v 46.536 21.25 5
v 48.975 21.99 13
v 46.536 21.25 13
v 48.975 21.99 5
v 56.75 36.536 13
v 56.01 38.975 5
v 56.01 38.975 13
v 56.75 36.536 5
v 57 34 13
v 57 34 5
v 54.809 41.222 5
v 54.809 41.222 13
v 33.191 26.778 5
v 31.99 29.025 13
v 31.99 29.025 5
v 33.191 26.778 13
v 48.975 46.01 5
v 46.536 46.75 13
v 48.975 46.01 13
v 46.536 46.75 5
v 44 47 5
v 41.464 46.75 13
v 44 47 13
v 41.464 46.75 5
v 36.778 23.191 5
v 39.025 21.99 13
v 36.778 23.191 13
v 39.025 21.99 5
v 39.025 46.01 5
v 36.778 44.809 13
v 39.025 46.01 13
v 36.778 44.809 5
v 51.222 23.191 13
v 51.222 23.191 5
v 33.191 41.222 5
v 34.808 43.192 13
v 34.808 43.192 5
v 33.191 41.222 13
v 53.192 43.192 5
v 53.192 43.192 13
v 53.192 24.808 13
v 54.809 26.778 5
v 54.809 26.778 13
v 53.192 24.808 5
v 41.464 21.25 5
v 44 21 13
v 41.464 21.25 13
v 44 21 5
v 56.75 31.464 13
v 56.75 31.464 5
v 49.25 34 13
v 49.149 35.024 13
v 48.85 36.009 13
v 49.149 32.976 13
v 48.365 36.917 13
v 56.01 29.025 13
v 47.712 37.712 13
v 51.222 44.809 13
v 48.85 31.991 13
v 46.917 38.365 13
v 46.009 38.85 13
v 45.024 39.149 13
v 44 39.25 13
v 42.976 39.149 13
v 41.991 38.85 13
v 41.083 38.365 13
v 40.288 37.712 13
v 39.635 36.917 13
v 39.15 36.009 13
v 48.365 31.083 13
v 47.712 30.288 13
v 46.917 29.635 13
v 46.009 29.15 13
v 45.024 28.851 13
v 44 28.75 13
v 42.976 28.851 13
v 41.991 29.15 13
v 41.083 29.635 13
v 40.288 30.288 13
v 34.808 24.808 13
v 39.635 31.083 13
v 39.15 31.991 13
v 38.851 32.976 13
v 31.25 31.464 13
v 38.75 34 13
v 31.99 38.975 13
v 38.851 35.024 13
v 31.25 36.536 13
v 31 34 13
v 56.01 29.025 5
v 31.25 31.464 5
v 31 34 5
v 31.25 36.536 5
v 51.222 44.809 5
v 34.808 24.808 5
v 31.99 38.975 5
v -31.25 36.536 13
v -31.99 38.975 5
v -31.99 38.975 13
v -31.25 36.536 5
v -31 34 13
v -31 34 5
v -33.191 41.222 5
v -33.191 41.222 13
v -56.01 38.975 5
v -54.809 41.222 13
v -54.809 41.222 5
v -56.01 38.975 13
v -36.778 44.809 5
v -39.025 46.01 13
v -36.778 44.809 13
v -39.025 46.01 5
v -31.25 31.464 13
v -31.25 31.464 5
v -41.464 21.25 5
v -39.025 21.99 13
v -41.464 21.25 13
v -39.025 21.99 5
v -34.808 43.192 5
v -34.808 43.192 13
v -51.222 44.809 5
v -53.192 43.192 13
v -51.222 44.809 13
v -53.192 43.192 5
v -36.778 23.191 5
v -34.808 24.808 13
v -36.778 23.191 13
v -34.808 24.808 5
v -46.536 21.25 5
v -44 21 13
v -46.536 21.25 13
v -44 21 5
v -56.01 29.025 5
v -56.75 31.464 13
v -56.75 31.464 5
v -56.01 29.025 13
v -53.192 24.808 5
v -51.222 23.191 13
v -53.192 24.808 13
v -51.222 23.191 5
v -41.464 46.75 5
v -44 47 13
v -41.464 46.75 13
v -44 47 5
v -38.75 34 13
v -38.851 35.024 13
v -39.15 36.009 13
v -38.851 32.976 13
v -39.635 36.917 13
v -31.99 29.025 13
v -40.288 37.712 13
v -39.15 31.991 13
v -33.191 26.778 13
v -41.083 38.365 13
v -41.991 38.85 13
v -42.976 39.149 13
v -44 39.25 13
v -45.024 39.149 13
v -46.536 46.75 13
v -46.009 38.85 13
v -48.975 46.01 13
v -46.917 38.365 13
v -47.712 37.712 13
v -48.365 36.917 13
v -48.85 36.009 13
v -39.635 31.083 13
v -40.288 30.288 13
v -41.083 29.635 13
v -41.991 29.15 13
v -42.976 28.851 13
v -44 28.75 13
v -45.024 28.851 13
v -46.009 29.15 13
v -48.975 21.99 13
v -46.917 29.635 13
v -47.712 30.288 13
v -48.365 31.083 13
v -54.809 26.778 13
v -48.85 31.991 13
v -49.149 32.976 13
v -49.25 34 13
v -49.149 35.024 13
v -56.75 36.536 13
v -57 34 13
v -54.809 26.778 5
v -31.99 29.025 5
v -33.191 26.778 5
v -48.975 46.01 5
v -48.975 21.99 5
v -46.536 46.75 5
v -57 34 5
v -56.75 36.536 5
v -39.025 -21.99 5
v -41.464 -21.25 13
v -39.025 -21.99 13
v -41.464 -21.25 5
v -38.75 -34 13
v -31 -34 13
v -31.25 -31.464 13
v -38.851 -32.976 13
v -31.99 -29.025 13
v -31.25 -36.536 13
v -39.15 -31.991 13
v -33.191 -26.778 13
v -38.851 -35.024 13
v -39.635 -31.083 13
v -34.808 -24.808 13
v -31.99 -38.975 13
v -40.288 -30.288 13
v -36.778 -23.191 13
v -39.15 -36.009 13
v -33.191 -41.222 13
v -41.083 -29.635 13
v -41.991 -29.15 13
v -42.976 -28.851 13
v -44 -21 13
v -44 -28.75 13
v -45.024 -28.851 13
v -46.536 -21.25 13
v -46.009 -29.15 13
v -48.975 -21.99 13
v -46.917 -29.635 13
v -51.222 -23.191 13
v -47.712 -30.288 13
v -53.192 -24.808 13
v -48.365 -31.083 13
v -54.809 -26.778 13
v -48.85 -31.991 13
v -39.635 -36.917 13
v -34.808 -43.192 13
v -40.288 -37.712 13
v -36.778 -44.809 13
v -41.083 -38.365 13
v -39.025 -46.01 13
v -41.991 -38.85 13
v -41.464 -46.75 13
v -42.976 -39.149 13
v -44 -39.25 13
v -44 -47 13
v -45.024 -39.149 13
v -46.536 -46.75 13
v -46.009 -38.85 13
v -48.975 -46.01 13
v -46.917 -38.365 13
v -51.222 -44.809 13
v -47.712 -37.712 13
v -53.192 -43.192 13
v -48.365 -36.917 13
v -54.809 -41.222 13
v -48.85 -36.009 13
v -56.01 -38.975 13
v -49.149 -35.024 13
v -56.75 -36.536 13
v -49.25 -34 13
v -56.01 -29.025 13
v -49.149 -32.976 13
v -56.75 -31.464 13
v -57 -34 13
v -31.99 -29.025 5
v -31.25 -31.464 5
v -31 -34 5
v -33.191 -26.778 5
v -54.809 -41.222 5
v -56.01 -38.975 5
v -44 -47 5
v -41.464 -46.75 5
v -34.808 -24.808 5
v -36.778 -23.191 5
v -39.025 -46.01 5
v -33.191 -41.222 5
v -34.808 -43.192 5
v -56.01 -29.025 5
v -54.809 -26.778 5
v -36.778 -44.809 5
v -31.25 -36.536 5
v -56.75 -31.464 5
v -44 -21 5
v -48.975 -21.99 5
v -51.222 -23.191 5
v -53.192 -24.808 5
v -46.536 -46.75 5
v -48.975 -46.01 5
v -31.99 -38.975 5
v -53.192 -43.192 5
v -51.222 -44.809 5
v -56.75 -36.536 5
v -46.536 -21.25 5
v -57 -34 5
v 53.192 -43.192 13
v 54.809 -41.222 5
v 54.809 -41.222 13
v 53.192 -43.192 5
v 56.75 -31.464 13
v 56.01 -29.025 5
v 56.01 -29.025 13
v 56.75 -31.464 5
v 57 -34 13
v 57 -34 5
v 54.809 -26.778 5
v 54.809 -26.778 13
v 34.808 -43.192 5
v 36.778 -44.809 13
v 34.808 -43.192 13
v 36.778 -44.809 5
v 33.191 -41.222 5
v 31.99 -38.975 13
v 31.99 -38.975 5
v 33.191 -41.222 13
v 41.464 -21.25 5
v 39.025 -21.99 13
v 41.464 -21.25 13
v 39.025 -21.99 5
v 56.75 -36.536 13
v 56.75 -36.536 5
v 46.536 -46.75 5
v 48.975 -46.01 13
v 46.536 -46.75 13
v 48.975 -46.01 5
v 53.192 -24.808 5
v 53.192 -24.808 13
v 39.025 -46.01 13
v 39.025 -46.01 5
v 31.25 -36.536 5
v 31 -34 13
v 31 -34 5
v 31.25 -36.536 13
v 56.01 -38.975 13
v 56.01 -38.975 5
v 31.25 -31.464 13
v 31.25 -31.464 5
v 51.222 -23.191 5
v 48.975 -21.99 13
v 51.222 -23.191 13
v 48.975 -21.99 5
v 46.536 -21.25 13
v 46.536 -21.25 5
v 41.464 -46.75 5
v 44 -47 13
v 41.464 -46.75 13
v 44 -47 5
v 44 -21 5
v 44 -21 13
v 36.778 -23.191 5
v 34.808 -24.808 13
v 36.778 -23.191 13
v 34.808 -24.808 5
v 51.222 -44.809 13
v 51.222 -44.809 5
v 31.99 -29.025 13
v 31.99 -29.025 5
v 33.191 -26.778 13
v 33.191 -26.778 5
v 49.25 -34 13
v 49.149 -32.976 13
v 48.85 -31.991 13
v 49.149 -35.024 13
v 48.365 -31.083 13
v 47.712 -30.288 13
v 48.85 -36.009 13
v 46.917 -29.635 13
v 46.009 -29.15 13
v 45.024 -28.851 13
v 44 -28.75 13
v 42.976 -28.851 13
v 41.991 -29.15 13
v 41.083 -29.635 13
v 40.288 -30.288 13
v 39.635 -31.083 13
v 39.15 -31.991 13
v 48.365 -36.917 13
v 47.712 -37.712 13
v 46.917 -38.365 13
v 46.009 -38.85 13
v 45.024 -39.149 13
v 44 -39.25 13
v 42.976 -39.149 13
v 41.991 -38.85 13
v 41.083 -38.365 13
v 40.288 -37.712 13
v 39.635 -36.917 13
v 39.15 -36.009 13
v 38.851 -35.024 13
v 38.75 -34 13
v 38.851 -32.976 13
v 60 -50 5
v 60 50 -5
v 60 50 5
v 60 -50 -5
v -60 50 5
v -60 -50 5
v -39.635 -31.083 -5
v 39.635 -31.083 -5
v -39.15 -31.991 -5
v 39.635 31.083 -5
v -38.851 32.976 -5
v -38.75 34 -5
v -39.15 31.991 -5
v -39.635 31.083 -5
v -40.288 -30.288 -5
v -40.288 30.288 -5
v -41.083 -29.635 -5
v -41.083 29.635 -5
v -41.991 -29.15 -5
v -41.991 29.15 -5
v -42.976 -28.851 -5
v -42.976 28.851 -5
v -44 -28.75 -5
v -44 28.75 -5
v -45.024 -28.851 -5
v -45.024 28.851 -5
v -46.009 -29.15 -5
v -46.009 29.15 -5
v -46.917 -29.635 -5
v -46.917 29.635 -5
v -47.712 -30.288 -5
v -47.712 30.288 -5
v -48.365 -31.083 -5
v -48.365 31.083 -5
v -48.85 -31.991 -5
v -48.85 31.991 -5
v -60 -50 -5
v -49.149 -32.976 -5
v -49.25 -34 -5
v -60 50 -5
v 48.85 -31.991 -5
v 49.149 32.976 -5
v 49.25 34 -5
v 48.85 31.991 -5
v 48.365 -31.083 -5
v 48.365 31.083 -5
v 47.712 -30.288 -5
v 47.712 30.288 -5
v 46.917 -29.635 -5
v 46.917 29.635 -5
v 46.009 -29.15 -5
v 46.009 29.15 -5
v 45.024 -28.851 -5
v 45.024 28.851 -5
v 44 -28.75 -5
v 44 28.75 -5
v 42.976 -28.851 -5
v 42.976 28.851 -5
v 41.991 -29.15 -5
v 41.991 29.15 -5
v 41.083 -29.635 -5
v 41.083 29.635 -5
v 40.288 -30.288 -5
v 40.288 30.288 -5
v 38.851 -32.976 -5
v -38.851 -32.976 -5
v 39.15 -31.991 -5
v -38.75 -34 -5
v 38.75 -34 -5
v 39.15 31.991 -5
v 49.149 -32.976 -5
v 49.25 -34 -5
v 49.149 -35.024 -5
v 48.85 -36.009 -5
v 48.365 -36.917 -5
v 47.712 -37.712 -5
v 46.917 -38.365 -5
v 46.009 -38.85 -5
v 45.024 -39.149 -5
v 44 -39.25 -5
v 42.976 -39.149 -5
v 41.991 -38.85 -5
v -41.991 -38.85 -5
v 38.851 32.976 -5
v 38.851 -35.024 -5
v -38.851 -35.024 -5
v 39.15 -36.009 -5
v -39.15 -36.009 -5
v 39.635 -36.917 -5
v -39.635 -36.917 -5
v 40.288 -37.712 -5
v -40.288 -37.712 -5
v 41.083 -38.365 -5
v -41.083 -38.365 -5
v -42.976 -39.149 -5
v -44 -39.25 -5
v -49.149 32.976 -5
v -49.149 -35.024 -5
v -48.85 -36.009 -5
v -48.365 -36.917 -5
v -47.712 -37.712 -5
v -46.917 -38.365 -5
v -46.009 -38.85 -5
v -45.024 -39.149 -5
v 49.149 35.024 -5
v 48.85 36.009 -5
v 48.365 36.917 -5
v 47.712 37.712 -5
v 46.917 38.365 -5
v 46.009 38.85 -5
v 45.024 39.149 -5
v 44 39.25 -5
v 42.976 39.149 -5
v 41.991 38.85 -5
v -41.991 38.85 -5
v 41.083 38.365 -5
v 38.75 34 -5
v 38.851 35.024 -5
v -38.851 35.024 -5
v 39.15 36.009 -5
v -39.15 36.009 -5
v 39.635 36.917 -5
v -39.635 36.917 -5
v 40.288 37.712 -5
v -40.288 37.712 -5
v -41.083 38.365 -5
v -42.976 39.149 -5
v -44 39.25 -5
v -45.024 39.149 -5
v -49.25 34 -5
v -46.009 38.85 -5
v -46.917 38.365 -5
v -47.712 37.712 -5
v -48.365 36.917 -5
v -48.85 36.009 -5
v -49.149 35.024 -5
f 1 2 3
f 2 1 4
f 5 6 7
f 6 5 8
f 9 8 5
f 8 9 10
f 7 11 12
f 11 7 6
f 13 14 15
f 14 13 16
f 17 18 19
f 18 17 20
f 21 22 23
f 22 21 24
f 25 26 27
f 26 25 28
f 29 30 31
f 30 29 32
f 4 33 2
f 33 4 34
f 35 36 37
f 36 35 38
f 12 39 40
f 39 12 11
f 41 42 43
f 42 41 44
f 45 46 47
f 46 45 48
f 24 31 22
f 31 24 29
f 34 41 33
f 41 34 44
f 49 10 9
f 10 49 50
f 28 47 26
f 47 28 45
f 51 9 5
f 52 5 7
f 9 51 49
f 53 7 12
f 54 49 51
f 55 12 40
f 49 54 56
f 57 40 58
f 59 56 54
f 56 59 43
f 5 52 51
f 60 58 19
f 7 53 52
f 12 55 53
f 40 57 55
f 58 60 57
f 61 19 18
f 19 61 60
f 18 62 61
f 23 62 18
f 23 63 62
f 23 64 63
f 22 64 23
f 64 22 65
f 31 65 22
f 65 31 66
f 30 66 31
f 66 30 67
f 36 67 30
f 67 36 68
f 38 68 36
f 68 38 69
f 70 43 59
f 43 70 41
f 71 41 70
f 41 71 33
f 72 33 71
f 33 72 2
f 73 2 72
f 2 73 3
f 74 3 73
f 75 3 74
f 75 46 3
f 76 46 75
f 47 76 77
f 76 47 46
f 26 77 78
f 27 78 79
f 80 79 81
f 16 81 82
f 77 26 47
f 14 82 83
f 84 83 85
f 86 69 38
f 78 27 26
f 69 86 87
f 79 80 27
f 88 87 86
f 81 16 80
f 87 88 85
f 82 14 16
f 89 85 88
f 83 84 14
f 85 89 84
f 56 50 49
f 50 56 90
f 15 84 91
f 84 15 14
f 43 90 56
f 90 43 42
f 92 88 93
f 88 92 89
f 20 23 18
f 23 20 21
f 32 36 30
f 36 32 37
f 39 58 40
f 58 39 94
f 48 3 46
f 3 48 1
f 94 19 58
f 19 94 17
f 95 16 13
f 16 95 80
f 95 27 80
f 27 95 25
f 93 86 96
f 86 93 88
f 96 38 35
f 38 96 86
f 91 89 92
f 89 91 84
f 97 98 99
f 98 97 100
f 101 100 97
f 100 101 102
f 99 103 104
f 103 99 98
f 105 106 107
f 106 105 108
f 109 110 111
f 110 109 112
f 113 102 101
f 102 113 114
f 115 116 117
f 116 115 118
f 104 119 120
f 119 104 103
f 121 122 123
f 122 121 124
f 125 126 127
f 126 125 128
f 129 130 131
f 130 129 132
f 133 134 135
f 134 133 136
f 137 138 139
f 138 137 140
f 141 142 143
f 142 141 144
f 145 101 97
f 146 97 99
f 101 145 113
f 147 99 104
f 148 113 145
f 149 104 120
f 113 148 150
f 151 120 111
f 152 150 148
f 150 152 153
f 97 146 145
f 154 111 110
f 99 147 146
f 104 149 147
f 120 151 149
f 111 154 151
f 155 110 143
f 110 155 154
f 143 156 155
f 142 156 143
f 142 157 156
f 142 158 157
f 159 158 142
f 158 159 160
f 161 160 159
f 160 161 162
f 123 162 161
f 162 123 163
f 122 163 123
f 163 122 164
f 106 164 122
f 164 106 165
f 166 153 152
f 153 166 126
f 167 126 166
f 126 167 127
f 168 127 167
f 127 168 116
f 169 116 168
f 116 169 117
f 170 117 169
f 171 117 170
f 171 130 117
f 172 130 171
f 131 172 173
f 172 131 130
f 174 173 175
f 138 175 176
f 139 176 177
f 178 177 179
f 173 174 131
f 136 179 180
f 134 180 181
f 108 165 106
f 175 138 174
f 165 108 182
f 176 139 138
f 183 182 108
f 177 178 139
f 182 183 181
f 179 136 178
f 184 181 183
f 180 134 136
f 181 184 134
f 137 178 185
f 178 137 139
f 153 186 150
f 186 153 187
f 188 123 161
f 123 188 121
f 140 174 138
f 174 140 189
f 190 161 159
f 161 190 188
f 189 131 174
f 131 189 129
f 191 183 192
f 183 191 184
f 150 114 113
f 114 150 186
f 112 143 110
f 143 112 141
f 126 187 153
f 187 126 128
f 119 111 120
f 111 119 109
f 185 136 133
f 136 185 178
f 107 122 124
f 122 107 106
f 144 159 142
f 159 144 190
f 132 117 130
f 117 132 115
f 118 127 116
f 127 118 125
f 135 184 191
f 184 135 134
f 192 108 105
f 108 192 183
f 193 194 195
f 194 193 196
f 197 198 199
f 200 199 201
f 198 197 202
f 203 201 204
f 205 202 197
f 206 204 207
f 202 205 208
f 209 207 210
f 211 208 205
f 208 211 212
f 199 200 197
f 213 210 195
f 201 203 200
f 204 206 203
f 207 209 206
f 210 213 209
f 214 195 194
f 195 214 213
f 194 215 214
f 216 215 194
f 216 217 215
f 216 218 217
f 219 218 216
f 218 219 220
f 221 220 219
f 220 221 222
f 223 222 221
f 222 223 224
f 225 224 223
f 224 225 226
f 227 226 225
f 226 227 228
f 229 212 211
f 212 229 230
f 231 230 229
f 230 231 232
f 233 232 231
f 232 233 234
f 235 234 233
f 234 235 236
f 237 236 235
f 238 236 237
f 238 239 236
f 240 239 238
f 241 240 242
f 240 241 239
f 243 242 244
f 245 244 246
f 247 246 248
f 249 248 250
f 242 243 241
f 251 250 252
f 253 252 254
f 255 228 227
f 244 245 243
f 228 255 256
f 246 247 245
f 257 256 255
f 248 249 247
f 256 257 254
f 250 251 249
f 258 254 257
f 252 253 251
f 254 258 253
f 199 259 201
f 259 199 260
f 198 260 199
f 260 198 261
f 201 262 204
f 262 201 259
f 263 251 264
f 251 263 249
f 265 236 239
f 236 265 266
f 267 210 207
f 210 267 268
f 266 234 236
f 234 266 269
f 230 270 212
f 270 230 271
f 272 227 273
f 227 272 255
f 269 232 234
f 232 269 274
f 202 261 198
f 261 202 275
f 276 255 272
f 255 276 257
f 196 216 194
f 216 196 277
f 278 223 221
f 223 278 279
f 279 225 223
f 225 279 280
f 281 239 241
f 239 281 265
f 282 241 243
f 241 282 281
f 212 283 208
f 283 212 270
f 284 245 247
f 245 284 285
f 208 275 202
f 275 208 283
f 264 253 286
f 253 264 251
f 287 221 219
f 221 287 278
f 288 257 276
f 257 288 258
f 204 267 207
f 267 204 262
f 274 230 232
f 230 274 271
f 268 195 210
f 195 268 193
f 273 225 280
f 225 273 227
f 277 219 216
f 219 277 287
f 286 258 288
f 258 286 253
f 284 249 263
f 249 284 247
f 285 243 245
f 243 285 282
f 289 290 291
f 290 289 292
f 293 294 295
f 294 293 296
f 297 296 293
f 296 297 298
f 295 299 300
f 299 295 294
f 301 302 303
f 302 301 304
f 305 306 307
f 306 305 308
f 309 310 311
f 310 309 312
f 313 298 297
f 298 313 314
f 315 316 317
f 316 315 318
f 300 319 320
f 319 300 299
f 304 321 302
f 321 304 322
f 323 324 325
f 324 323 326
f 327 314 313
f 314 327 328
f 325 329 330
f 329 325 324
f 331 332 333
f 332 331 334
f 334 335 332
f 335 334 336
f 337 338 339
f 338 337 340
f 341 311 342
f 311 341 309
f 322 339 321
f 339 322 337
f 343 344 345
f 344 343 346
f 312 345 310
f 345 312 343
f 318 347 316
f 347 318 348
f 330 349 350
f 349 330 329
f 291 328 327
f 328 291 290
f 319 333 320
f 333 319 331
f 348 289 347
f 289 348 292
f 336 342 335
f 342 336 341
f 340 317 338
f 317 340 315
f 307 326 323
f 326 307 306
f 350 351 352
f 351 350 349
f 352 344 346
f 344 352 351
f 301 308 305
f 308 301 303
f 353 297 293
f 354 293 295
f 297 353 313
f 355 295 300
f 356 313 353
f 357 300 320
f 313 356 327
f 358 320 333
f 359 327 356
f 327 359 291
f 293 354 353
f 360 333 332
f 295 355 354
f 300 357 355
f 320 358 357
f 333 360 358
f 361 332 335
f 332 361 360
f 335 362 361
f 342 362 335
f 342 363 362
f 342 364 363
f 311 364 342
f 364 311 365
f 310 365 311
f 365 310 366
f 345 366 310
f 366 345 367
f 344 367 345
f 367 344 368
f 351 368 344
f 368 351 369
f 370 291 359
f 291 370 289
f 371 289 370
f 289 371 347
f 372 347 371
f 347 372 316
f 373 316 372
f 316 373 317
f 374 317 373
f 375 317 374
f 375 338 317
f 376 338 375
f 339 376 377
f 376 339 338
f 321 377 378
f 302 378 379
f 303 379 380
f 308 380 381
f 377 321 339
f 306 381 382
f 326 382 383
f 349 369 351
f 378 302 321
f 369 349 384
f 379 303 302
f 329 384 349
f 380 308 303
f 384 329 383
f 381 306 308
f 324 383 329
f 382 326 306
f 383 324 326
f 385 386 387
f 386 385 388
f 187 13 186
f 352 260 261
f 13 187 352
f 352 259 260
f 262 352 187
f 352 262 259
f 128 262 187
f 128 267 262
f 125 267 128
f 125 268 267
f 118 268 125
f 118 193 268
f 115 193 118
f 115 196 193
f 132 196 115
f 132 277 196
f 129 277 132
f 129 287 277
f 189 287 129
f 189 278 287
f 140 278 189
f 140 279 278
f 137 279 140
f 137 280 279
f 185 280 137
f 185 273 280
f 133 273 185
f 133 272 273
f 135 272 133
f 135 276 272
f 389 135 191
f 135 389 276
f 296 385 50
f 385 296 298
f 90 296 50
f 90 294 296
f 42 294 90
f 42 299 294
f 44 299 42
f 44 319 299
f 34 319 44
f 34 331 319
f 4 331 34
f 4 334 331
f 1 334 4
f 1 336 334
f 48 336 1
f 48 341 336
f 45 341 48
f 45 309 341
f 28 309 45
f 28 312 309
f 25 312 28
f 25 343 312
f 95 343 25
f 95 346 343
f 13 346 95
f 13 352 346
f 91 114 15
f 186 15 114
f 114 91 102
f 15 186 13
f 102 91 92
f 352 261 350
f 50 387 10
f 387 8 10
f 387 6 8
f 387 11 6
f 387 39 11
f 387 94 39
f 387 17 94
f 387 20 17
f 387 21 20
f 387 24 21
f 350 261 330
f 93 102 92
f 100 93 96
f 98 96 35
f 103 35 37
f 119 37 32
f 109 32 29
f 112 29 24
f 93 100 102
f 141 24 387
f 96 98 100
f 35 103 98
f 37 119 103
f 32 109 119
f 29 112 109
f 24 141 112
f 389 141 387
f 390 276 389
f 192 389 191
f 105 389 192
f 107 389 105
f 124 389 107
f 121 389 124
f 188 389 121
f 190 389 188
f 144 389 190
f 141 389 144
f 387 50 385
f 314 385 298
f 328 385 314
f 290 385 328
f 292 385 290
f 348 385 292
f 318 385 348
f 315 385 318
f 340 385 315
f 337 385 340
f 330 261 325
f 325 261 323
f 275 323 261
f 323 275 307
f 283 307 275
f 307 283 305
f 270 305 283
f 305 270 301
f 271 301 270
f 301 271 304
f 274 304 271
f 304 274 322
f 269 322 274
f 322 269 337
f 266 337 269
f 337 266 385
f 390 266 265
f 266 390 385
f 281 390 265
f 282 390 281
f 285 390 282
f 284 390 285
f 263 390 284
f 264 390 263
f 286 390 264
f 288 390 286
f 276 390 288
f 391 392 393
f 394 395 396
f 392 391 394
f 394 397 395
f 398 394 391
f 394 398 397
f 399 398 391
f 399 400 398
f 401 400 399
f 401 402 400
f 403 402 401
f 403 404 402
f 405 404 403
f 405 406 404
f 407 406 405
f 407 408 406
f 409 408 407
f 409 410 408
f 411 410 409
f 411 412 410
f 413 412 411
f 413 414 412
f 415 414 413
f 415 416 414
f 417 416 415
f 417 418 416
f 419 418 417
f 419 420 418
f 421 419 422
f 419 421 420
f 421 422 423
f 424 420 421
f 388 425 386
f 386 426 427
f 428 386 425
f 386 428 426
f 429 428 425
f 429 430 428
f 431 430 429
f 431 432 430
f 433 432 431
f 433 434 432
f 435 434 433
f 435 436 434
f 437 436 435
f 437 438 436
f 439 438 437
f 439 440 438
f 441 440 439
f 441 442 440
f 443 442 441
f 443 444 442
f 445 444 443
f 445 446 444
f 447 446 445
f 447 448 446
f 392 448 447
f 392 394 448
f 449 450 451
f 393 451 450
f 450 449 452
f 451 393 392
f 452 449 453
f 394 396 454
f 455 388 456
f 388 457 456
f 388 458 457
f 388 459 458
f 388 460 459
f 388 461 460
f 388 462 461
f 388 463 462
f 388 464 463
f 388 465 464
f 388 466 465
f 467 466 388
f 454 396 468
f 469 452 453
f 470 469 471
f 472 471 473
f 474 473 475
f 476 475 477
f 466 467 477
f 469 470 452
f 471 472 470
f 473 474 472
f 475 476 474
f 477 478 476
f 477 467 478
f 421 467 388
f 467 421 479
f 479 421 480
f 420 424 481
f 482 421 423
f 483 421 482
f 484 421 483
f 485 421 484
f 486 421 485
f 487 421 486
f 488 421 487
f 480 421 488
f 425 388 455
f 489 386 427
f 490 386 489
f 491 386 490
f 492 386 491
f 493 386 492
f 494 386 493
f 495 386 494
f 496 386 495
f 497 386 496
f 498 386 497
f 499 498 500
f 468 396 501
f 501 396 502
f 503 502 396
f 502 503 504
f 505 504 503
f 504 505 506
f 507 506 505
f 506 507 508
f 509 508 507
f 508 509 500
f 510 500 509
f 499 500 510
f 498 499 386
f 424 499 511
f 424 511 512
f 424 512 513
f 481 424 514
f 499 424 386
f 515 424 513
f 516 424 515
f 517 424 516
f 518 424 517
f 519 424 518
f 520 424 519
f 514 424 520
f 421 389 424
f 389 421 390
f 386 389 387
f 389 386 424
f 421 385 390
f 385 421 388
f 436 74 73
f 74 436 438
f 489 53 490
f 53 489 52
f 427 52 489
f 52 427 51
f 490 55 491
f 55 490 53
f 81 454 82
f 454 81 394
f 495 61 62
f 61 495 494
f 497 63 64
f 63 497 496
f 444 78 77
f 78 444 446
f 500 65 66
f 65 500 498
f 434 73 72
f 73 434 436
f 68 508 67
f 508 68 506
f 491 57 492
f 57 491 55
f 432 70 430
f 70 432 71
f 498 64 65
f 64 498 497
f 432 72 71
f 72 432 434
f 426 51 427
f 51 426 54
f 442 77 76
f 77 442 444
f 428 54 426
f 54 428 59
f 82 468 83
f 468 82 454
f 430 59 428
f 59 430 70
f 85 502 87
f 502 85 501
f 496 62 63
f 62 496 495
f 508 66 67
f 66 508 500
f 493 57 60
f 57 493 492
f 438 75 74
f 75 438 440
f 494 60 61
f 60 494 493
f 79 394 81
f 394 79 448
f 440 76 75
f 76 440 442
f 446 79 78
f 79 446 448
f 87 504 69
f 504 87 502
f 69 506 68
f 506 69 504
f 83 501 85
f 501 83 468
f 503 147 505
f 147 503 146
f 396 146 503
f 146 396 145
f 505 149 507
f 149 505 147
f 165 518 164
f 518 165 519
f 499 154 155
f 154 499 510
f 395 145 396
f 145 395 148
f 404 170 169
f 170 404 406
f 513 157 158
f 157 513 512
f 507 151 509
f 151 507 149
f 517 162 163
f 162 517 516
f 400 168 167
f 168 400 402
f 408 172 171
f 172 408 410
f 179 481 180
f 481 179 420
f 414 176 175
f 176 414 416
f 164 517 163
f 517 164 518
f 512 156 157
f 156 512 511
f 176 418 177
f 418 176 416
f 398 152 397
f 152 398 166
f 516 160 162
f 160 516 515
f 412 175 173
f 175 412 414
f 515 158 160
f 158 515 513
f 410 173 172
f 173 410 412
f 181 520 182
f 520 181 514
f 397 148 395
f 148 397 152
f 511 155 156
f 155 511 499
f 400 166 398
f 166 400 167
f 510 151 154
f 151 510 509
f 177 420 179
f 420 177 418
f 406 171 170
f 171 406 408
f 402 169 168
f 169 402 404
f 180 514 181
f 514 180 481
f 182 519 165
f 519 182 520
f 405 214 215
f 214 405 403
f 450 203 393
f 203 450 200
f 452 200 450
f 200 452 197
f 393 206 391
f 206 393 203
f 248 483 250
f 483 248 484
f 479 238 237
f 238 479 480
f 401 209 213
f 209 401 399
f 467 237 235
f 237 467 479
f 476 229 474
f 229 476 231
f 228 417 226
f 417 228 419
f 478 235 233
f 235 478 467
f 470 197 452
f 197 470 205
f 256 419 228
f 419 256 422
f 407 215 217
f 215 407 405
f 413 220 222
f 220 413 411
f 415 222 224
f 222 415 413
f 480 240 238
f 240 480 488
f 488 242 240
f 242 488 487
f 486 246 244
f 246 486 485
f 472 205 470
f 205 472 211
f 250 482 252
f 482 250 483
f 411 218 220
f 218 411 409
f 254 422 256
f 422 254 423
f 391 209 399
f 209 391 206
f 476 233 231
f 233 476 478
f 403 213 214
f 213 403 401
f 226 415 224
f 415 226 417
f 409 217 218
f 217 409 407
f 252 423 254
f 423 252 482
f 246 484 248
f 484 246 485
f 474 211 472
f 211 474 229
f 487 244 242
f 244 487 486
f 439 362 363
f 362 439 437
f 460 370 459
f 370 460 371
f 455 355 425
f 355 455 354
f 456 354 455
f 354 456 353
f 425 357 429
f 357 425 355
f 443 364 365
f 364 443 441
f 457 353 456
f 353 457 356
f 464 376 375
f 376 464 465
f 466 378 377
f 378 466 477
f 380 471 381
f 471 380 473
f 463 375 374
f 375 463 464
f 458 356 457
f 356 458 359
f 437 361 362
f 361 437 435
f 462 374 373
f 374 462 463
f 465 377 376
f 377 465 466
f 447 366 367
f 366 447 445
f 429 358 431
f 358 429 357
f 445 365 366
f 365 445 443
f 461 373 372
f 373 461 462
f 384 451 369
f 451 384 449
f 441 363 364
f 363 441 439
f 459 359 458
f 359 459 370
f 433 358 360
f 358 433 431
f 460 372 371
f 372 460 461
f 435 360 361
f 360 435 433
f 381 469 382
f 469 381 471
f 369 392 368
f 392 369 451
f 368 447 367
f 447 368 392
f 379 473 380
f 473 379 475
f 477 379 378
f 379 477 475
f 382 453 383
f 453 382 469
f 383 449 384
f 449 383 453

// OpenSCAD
$fn = 32;

// ----------------------------------------------------------------------
// Anchor pads 120 x 100 x 18
// four corner bosses with anchor holes
// ----------------------------------------------------------------------

// --- parameters (mm) ---
plate = [120, 100, 10];  // base plate size (x, y, z)
pads = 4;                // boss count, one per corner
edge = 16;               // boss centre offset from the plate edge
boss_d = 26;             // boss diameter
boss_h = 8;              // boss height above the base plate
hole_d = 10.5;           // hole diameter

// --- derived feature positions (mm) ---
height = plate[2] + boss_h;      // = 18   overall height of the part
corner_x = plate[0] / 2 - edge;  // = 44   boss centre X
corner_y = plate[1] / 2 - edge;  // = 34   boss centre Y
feature_centers = [
  [corner_x, corner_y],
  [-corner_x, corner_y],
  [-corner_x, -corner_y],
  [corner_x, -corner_y]
];   // boss centres, anchor holes are drilled there

// base plate, four bosses standing on it, anchor holes all the way through
difference() {
  union() {
    cube(plate, center = true);
    for (centre = feature_centers)
      translate([centre[0], centre[1], plate[2] / 2 - 1])
        cylinder(d = boss_d, h = boss_h + 1);
  }
  for (centre = feature_centers)
    translate([centre[0], centre[1], -height])
      cylinder(d = hole_d, h = 2 * height + 2);  // through boss and plate
}
